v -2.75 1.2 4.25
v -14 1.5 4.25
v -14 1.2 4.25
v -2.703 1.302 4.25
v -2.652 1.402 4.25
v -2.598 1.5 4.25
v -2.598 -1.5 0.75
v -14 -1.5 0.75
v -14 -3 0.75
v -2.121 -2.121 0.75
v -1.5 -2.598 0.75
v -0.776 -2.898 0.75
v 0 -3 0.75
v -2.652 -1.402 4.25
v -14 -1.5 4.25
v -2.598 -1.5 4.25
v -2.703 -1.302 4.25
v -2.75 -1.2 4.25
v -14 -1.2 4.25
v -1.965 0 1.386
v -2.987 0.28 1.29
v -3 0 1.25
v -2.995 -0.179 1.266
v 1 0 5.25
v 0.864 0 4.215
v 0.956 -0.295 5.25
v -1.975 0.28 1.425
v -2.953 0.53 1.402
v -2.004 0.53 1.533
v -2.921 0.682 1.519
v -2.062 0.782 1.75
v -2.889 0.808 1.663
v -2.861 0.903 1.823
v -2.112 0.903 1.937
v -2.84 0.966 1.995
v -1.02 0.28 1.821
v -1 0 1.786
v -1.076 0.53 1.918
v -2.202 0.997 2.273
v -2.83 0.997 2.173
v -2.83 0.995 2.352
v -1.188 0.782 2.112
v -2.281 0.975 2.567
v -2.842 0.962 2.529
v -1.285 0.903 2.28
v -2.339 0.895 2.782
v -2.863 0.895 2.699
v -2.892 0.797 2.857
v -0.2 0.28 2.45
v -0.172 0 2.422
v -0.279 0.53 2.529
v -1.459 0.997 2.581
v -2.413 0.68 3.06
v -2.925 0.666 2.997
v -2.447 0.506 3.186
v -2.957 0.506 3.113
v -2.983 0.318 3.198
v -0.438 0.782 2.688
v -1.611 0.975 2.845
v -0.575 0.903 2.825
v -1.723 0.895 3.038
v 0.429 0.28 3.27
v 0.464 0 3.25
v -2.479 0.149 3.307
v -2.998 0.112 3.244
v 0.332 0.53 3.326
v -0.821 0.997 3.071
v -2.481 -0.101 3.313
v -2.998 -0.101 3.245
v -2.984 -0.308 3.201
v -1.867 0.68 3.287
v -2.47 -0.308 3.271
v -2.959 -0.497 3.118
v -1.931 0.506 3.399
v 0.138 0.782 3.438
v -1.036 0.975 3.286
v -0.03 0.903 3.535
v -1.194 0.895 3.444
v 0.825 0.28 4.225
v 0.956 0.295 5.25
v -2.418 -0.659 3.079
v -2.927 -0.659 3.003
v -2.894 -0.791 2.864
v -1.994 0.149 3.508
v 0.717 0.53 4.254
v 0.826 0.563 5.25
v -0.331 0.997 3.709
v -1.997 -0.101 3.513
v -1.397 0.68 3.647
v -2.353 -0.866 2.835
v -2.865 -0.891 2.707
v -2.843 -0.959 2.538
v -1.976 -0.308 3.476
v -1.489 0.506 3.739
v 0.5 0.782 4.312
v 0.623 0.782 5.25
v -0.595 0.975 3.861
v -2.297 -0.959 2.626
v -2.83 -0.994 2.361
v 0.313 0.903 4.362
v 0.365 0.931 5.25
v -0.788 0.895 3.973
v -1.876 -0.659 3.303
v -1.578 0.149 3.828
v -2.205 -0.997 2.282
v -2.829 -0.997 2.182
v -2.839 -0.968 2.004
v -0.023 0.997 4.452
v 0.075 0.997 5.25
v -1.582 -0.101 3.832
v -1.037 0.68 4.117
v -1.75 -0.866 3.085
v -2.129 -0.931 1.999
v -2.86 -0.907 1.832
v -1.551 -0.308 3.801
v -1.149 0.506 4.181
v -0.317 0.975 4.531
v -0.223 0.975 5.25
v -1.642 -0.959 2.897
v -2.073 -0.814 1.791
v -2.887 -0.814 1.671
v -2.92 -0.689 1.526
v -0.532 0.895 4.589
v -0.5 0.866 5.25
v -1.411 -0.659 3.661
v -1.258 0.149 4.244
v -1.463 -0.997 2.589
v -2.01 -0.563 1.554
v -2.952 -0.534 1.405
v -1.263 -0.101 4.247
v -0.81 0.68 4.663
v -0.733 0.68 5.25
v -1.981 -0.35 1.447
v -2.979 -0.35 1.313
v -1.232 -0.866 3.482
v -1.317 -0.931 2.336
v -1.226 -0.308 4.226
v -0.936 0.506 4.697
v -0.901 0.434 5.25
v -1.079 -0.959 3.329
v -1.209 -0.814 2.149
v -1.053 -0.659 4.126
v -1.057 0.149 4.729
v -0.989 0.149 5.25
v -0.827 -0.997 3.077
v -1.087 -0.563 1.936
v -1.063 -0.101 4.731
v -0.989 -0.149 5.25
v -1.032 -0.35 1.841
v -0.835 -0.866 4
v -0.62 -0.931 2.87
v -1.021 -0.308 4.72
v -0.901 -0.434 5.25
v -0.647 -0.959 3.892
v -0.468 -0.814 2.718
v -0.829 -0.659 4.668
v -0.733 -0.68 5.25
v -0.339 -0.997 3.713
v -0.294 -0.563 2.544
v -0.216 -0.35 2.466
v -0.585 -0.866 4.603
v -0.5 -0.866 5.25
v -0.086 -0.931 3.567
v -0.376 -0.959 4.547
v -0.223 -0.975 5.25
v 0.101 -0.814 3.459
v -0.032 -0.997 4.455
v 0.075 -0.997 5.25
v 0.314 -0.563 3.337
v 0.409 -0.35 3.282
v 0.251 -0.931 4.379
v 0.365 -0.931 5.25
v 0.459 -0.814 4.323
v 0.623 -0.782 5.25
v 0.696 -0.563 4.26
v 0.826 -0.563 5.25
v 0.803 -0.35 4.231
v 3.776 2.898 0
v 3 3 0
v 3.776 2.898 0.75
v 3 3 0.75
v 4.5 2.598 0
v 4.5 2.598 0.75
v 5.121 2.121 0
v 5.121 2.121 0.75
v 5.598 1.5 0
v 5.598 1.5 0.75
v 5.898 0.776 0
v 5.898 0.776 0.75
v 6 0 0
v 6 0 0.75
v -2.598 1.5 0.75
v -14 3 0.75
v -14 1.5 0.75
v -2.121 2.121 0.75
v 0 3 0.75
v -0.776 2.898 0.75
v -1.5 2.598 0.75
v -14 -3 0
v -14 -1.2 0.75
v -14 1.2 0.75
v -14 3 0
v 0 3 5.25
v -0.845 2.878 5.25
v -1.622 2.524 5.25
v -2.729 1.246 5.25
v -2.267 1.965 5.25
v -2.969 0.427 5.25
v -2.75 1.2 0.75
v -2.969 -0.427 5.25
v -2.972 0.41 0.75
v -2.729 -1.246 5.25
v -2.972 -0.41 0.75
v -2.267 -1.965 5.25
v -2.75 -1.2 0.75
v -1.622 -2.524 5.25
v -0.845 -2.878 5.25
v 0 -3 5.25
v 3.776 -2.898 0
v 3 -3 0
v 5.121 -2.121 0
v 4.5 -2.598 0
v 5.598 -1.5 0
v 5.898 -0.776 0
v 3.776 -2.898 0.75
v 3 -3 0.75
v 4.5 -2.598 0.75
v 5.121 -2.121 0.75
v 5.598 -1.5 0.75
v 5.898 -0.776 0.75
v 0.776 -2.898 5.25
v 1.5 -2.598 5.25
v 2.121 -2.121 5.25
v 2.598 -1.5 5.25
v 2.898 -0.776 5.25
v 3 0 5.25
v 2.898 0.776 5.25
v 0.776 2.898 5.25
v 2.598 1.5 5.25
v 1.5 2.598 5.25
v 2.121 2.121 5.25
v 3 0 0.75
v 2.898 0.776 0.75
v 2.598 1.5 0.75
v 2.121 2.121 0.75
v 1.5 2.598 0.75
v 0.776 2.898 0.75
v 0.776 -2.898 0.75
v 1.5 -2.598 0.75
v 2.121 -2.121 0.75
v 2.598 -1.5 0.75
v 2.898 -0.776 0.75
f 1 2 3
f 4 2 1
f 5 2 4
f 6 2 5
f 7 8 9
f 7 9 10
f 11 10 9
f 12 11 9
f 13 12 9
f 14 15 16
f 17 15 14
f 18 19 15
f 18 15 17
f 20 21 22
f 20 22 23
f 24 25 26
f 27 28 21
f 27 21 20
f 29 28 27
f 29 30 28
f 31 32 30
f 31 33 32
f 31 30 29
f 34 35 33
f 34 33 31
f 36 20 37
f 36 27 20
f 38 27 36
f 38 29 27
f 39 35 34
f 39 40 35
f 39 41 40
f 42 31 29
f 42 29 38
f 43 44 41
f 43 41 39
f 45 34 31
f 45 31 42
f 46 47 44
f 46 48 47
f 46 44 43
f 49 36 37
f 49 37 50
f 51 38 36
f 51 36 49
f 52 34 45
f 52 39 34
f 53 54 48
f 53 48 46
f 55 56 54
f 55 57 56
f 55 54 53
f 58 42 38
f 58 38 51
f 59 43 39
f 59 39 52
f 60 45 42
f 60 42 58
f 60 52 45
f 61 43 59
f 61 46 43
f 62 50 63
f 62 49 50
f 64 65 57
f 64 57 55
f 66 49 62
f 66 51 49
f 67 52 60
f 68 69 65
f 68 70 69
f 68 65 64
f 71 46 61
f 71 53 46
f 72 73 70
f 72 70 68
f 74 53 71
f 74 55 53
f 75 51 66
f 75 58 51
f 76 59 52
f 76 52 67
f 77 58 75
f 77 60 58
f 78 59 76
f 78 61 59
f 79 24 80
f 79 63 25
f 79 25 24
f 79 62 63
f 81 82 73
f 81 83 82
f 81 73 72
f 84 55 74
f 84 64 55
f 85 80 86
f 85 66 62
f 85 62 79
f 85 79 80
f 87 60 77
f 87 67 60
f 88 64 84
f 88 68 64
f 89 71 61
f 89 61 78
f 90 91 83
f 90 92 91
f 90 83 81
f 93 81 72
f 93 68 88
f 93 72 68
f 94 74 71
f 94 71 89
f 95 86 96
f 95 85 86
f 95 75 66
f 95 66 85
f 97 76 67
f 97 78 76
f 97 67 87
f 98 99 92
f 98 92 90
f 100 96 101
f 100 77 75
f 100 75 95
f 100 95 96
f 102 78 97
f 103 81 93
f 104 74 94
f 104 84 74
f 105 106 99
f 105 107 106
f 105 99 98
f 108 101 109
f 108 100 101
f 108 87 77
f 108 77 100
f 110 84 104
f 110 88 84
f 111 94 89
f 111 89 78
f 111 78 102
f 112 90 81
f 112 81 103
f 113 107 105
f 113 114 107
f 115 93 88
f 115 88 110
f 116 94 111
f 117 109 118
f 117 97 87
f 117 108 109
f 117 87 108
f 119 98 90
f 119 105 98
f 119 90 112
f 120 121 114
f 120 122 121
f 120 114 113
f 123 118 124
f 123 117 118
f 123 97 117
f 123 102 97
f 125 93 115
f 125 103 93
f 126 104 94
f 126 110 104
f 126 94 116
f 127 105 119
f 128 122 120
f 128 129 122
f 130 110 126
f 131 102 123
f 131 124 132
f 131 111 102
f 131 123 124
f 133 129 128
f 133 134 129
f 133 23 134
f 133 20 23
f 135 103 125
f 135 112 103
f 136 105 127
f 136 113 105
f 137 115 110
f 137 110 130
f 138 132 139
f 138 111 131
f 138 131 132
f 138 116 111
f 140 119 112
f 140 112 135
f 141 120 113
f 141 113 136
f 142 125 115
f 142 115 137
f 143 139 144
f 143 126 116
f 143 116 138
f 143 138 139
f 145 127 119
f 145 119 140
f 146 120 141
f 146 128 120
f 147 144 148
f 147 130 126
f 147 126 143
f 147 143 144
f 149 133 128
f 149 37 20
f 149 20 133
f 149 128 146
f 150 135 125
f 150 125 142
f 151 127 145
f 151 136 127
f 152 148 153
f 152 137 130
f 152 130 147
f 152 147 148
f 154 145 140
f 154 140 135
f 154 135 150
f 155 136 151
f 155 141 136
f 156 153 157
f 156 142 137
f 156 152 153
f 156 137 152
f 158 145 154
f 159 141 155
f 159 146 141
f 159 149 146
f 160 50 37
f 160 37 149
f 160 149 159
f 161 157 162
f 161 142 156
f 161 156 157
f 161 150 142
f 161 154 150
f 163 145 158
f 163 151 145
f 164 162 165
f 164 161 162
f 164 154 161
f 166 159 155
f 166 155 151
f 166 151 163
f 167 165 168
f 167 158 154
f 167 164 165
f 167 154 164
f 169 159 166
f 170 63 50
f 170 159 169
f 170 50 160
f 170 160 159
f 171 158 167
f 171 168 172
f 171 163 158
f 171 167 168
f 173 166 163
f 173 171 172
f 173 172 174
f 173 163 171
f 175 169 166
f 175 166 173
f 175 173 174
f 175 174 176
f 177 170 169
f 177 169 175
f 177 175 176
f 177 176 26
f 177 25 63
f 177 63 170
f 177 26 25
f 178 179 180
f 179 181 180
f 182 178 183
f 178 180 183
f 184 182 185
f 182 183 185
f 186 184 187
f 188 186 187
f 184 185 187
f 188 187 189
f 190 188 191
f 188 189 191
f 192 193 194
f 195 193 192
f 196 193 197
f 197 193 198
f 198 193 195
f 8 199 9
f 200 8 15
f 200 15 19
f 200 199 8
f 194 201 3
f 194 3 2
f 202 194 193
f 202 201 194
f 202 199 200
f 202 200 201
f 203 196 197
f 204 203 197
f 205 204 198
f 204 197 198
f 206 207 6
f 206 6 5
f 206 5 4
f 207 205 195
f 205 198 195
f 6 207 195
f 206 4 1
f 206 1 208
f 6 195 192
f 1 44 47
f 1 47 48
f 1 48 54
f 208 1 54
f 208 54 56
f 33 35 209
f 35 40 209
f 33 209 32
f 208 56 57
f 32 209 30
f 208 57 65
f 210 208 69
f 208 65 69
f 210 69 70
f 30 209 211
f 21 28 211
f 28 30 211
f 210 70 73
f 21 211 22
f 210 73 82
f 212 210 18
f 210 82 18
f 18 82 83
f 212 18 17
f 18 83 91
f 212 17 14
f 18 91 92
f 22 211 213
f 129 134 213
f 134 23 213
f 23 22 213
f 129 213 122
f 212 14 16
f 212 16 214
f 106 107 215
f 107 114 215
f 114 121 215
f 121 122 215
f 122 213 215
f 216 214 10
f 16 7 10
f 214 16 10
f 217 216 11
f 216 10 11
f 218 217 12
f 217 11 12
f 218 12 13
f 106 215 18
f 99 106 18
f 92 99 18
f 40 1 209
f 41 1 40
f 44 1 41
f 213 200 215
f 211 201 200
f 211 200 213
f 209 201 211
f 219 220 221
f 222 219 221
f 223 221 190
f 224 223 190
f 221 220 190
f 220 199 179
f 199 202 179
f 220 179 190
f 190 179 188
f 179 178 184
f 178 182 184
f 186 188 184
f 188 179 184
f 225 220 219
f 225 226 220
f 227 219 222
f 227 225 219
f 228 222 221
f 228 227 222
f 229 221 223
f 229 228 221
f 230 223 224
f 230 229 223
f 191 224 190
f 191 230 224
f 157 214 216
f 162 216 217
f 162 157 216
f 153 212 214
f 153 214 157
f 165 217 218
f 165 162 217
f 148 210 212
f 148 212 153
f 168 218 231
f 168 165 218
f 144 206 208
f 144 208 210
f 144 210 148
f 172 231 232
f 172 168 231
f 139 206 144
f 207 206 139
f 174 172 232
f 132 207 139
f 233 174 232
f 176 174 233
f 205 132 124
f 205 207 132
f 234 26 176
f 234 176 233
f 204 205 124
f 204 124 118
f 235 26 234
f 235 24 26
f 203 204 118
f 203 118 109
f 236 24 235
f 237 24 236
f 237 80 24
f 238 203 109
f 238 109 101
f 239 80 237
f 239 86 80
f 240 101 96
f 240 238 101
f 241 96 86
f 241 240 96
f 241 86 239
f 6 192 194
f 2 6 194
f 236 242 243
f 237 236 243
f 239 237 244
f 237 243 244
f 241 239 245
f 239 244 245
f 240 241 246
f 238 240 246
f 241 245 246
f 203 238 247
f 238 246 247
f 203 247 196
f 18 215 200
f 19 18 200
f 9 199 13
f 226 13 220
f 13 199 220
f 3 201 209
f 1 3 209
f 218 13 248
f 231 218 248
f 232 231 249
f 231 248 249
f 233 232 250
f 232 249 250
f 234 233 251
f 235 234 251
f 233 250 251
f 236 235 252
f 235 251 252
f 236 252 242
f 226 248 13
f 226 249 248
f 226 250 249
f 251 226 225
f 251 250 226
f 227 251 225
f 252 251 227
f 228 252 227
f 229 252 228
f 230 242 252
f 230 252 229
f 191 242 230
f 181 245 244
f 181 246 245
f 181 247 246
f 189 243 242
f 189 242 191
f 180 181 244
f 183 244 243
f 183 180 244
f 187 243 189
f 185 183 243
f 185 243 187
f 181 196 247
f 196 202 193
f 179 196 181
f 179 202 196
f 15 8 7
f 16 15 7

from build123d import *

# Parameters (mm, degrees)
F0_W     = 20
F0_H     = 6
F1_DEPTH = 0.75
F3_DEPTH = 4.5
F4_R     = 1
F6_R     = 2.99999
F8_DEPTH = 3.5


# Not quite as in the source:
# - a fillet or chamfer is up to 0.001 mm smaller than in the source, because OpenCascade refuses the exact size


with BuildPart() as f1:
    # F0 (on Top) → F1 (new body)
    with BuildSketch(Plane.XY):
        with Locations((-4, 0)):
            Rectangle(F0_W, F0_H)
    extrude(amount=F1_DEPTH)

    # F2 (on face) → F3 (join)
    with BuildSketch(Plane.XY.offset(0.75)):
        with BuildLine():
            ThreePointArc((0, -3), (2.1213203436, -2.1213203436), (3, 0))
            ThreePointArc((3, 0), (2.1213203436, 2.1213203436), (0, 3))
            ThreePointArc((0, 3), (-3, 0), (0, -3))
        make_face()
    extrude(amount=F3_DEPTH)

    # F4 (on face) → F5 (revolve, cut)
    with BuildSketch(Plane.XY.offset(5.25)):
        Circle(F4_R)
    revolve(axis=Axis((-3, -2.9594153166, 5.25), (0, -1, 0)), mode=Mode.SUBTRACT)

    # F6 (radius 3 in the source; OpenCascade refuses exactly that, so slightly less here)
    f6_edges = [f1.edges().sort_by_distance(p)[0] for p in [
        (6, -3, 0.375),
        (6, 3, 0.375),
    ]]
    fillet(f6_edges, radius=F6_R)

    # F7 (on face) → F8 (join)
    with BuildSketch(Plane.XY.offset(0.75)):
        with BuildLine():
            Line((-2.5980762114, 1.5), (-14, 1.5))
            Line((-14, 1.5), (-14, 1.2))
            Line((-14, 1.2), (-2.749545417, 1.2))
            ThreePointArc((-2.749545417, 1.2), (-2.6780149869, 1.3521226757), (-2.5980762114, 1.5))
        make_face()
        with BuildLine():
            Line((-2.749545417, -1.2), (-14, -1.2))
            Line((-14, -1.2), (-14, -1.5))
            Line((-14, -1.5), (-2.5980762114, -1.5))
            ThreePointArc((-2.5980762114, -1.5), (-2.6780149869, -1.3521226757), (-2.749545417, -1.2))
        make_face()
    extrude(amount=F8_DEPTH)


solid = f1.part
